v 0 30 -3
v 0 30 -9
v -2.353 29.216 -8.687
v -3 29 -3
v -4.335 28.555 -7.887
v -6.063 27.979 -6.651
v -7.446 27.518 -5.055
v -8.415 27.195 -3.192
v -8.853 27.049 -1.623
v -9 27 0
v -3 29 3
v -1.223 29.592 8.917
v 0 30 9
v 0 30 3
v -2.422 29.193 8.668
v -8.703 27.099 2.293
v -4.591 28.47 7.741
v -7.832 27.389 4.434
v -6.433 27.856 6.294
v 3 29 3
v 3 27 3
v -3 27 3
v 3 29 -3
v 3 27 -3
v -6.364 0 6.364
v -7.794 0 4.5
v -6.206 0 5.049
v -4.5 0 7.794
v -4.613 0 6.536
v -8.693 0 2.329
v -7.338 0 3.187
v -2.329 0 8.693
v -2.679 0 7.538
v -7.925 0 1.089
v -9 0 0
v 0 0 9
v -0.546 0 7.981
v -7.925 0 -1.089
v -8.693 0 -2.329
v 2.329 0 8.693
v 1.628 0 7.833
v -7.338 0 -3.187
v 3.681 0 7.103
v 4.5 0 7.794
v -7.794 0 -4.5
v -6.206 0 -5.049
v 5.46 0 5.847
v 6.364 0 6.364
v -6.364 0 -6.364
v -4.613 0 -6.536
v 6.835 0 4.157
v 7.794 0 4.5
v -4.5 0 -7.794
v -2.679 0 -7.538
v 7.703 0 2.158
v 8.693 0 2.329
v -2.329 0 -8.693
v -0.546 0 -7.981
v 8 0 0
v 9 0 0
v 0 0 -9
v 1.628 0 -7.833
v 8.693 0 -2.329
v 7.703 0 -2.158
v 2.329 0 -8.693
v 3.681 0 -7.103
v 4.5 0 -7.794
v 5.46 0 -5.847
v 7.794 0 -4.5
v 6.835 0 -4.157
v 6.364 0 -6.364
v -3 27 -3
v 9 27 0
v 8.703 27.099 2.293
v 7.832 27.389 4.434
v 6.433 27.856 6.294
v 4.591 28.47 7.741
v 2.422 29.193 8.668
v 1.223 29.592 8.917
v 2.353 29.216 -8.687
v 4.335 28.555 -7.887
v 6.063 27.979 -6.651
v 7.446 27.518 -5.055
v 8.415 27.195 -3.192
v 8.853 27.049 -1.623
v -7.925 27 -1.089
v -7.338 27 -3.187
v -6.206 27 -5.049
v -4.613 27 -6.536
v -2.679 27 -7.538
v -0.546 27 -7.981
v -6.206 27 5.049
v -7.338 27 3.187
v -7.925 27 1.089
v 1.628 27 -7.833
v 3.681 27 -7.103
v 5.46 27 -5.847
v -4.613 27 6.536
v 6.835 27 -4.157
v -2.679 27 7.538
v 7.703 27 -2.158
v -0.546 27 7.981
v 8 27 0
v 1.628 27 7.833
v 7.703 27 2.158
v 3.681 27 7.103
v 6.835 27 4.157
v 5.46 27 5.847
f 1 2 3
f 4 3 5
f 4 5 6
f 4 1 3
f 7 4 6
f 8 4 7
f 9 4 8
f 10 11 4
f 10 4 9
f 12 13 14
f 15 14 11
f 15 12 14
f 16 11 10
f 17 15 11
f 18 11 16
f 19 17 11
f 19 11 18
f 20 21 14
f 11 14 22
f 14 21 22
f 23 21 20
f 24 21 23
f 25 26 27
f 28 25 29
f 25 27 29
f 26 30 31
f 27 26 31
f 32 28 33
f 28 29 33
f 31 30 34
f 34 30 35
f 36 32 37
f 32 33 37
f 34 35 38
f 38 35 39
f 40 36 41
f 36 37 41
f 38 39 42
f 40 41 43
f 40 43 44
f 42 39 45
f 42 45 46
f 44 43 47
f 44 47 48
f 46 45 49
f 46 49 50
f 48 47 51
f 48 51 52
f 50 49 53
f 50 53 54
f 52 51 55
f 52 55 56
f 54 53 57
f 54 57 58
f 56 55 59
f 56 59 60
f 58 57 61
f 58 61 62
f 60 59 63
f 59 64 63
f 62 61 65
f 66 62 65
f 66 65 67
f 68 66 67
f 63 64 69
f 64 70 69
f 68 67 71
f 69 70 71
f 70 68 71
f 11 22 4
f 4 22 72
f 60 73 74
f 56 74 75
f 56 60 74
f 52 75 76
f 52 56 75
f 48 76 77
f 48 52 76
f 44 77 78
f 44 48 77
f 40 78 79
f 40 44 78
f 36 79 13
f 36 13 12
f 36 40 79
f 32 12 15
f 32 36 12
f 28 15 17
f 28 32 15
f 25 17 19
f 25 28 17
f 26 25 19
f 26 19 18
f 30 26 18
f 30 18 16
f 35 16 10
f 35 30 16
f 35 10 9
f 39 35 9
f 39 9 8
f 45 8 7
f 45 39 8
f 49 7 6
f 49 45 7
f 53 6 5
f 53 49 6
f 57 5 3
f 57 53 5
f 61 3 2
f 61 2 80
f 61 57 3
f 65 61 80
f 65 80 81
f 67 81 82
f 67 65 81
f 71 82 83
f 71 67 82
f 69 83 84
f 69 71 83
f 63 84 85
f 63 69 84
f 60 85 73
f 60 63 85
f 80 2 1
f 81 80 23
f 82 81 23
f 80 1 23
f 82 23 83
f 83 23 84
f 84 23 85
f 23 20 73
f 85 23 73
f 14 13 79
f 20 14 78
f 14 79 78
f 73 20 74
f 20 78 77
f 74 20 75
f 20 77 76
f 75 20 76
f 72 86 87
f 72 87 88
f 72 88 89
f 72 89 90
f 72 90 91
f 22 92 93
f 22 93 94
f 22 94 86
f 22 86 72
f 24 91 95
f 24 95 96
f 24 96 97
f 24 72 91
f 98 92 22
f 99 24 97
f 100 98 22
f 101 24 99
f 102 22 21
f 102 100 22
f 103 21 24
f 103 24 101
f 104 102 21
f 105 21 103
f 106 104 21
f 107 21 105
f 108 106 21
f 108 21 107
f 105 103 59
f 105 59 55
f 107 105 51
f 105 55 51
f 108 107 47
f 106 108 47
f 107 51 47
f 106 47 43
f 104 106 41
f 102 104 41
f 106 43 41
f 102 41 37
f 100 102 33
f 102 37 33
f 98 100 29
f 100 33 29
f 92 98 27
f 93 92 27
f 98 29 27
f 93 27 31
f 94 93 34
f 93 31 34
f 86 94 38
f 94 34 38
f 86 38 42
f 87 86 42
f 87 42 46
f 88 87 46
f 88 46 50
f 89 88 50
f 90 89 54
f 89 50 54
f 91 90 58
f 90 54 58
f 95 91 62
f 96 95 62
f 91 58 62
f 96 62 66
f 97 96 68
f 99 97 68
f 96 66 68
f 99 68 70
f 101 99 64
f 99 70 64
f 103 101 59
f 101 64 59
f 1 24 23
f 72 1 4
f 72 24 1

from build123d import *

# Parameters (mm, degrees)
BOSS_EXTRUDE3_DEPTH      = 9
BOSS_EXTRUDE3_DEPTH_BACK = 9
SKETCH7_R                = 14.642288151
SKETCH7_R_2              = 9
CUT_EXTRUDE3_DEPTH       = 32
SKETCH8_W                = 6
SKETCH8_H                = 6
CUT_EXTRUDE4_DEPTH       = 32
SKETCH9_R                = 8
CUT_EXTRUDE5_DEPTH       = 27


with BuildPart() as part:
    # Sketch1 → Revolve4 (revolve)
    with BuildSketch(Plane.XY):
        Polygon((0, 27), (9, 27), (9, 24.588457268), (9, 0), (0, 0), align=None)
    revolve(axis=Axis((0, 0, 0), (0, 1, 0)))

    # Sketch6 → Boss-Extrude3 (add, two sides)
    with BuildSketch(Plane.XY) as boss_extrude3_sk:
        Polygon((0, 27), (0, 30), (9, 27), align=None)
        Polygon((0, 30), (-9, 27), (0, 27), align=None)
    extrude(amount=BOSS_EXTRUDE3_DEPTH)
    extrude(boss_extrude3_sk.sketch, amount=-BOSS_EXTRUDE3_DEPTH_BACK)

    # Sketch7 → Cut-Extrude3 (cut)
    with BuildSketch(Plane.XZ):
        Circle(SKETCH7_R)
        Circle(SKETCH7_R_2, mode=Mode.SUBTRACT)
    extrude(amount=-CUT_EXTRUDE3_DEPTH, mode=Mode.SUBTRACT)

    # Sketch8 → Cut-Extrude4 (cut)
    with BuildSketch(Plane(origin=(0, 0, 0), x_dir=(-1, 0, 0), z_dir=(0, -1, 0))):
        Rectangle(SKETCH8_W, SKETCH8_H)
    extrude(amount=-CUT_EXTRUDE4_DEPTH, mode=Mode.SUBTRACT)

    # Sketch9 → Cut-Extrude5 (cut)
    with BuildSketch(Plane.XZ):
        Circle(SKETCH9_R)
    extrude(amount=-CUT_EXTRUDE5_DEPTH, mode=Mode.SUBTRACT)


solid = part.part
